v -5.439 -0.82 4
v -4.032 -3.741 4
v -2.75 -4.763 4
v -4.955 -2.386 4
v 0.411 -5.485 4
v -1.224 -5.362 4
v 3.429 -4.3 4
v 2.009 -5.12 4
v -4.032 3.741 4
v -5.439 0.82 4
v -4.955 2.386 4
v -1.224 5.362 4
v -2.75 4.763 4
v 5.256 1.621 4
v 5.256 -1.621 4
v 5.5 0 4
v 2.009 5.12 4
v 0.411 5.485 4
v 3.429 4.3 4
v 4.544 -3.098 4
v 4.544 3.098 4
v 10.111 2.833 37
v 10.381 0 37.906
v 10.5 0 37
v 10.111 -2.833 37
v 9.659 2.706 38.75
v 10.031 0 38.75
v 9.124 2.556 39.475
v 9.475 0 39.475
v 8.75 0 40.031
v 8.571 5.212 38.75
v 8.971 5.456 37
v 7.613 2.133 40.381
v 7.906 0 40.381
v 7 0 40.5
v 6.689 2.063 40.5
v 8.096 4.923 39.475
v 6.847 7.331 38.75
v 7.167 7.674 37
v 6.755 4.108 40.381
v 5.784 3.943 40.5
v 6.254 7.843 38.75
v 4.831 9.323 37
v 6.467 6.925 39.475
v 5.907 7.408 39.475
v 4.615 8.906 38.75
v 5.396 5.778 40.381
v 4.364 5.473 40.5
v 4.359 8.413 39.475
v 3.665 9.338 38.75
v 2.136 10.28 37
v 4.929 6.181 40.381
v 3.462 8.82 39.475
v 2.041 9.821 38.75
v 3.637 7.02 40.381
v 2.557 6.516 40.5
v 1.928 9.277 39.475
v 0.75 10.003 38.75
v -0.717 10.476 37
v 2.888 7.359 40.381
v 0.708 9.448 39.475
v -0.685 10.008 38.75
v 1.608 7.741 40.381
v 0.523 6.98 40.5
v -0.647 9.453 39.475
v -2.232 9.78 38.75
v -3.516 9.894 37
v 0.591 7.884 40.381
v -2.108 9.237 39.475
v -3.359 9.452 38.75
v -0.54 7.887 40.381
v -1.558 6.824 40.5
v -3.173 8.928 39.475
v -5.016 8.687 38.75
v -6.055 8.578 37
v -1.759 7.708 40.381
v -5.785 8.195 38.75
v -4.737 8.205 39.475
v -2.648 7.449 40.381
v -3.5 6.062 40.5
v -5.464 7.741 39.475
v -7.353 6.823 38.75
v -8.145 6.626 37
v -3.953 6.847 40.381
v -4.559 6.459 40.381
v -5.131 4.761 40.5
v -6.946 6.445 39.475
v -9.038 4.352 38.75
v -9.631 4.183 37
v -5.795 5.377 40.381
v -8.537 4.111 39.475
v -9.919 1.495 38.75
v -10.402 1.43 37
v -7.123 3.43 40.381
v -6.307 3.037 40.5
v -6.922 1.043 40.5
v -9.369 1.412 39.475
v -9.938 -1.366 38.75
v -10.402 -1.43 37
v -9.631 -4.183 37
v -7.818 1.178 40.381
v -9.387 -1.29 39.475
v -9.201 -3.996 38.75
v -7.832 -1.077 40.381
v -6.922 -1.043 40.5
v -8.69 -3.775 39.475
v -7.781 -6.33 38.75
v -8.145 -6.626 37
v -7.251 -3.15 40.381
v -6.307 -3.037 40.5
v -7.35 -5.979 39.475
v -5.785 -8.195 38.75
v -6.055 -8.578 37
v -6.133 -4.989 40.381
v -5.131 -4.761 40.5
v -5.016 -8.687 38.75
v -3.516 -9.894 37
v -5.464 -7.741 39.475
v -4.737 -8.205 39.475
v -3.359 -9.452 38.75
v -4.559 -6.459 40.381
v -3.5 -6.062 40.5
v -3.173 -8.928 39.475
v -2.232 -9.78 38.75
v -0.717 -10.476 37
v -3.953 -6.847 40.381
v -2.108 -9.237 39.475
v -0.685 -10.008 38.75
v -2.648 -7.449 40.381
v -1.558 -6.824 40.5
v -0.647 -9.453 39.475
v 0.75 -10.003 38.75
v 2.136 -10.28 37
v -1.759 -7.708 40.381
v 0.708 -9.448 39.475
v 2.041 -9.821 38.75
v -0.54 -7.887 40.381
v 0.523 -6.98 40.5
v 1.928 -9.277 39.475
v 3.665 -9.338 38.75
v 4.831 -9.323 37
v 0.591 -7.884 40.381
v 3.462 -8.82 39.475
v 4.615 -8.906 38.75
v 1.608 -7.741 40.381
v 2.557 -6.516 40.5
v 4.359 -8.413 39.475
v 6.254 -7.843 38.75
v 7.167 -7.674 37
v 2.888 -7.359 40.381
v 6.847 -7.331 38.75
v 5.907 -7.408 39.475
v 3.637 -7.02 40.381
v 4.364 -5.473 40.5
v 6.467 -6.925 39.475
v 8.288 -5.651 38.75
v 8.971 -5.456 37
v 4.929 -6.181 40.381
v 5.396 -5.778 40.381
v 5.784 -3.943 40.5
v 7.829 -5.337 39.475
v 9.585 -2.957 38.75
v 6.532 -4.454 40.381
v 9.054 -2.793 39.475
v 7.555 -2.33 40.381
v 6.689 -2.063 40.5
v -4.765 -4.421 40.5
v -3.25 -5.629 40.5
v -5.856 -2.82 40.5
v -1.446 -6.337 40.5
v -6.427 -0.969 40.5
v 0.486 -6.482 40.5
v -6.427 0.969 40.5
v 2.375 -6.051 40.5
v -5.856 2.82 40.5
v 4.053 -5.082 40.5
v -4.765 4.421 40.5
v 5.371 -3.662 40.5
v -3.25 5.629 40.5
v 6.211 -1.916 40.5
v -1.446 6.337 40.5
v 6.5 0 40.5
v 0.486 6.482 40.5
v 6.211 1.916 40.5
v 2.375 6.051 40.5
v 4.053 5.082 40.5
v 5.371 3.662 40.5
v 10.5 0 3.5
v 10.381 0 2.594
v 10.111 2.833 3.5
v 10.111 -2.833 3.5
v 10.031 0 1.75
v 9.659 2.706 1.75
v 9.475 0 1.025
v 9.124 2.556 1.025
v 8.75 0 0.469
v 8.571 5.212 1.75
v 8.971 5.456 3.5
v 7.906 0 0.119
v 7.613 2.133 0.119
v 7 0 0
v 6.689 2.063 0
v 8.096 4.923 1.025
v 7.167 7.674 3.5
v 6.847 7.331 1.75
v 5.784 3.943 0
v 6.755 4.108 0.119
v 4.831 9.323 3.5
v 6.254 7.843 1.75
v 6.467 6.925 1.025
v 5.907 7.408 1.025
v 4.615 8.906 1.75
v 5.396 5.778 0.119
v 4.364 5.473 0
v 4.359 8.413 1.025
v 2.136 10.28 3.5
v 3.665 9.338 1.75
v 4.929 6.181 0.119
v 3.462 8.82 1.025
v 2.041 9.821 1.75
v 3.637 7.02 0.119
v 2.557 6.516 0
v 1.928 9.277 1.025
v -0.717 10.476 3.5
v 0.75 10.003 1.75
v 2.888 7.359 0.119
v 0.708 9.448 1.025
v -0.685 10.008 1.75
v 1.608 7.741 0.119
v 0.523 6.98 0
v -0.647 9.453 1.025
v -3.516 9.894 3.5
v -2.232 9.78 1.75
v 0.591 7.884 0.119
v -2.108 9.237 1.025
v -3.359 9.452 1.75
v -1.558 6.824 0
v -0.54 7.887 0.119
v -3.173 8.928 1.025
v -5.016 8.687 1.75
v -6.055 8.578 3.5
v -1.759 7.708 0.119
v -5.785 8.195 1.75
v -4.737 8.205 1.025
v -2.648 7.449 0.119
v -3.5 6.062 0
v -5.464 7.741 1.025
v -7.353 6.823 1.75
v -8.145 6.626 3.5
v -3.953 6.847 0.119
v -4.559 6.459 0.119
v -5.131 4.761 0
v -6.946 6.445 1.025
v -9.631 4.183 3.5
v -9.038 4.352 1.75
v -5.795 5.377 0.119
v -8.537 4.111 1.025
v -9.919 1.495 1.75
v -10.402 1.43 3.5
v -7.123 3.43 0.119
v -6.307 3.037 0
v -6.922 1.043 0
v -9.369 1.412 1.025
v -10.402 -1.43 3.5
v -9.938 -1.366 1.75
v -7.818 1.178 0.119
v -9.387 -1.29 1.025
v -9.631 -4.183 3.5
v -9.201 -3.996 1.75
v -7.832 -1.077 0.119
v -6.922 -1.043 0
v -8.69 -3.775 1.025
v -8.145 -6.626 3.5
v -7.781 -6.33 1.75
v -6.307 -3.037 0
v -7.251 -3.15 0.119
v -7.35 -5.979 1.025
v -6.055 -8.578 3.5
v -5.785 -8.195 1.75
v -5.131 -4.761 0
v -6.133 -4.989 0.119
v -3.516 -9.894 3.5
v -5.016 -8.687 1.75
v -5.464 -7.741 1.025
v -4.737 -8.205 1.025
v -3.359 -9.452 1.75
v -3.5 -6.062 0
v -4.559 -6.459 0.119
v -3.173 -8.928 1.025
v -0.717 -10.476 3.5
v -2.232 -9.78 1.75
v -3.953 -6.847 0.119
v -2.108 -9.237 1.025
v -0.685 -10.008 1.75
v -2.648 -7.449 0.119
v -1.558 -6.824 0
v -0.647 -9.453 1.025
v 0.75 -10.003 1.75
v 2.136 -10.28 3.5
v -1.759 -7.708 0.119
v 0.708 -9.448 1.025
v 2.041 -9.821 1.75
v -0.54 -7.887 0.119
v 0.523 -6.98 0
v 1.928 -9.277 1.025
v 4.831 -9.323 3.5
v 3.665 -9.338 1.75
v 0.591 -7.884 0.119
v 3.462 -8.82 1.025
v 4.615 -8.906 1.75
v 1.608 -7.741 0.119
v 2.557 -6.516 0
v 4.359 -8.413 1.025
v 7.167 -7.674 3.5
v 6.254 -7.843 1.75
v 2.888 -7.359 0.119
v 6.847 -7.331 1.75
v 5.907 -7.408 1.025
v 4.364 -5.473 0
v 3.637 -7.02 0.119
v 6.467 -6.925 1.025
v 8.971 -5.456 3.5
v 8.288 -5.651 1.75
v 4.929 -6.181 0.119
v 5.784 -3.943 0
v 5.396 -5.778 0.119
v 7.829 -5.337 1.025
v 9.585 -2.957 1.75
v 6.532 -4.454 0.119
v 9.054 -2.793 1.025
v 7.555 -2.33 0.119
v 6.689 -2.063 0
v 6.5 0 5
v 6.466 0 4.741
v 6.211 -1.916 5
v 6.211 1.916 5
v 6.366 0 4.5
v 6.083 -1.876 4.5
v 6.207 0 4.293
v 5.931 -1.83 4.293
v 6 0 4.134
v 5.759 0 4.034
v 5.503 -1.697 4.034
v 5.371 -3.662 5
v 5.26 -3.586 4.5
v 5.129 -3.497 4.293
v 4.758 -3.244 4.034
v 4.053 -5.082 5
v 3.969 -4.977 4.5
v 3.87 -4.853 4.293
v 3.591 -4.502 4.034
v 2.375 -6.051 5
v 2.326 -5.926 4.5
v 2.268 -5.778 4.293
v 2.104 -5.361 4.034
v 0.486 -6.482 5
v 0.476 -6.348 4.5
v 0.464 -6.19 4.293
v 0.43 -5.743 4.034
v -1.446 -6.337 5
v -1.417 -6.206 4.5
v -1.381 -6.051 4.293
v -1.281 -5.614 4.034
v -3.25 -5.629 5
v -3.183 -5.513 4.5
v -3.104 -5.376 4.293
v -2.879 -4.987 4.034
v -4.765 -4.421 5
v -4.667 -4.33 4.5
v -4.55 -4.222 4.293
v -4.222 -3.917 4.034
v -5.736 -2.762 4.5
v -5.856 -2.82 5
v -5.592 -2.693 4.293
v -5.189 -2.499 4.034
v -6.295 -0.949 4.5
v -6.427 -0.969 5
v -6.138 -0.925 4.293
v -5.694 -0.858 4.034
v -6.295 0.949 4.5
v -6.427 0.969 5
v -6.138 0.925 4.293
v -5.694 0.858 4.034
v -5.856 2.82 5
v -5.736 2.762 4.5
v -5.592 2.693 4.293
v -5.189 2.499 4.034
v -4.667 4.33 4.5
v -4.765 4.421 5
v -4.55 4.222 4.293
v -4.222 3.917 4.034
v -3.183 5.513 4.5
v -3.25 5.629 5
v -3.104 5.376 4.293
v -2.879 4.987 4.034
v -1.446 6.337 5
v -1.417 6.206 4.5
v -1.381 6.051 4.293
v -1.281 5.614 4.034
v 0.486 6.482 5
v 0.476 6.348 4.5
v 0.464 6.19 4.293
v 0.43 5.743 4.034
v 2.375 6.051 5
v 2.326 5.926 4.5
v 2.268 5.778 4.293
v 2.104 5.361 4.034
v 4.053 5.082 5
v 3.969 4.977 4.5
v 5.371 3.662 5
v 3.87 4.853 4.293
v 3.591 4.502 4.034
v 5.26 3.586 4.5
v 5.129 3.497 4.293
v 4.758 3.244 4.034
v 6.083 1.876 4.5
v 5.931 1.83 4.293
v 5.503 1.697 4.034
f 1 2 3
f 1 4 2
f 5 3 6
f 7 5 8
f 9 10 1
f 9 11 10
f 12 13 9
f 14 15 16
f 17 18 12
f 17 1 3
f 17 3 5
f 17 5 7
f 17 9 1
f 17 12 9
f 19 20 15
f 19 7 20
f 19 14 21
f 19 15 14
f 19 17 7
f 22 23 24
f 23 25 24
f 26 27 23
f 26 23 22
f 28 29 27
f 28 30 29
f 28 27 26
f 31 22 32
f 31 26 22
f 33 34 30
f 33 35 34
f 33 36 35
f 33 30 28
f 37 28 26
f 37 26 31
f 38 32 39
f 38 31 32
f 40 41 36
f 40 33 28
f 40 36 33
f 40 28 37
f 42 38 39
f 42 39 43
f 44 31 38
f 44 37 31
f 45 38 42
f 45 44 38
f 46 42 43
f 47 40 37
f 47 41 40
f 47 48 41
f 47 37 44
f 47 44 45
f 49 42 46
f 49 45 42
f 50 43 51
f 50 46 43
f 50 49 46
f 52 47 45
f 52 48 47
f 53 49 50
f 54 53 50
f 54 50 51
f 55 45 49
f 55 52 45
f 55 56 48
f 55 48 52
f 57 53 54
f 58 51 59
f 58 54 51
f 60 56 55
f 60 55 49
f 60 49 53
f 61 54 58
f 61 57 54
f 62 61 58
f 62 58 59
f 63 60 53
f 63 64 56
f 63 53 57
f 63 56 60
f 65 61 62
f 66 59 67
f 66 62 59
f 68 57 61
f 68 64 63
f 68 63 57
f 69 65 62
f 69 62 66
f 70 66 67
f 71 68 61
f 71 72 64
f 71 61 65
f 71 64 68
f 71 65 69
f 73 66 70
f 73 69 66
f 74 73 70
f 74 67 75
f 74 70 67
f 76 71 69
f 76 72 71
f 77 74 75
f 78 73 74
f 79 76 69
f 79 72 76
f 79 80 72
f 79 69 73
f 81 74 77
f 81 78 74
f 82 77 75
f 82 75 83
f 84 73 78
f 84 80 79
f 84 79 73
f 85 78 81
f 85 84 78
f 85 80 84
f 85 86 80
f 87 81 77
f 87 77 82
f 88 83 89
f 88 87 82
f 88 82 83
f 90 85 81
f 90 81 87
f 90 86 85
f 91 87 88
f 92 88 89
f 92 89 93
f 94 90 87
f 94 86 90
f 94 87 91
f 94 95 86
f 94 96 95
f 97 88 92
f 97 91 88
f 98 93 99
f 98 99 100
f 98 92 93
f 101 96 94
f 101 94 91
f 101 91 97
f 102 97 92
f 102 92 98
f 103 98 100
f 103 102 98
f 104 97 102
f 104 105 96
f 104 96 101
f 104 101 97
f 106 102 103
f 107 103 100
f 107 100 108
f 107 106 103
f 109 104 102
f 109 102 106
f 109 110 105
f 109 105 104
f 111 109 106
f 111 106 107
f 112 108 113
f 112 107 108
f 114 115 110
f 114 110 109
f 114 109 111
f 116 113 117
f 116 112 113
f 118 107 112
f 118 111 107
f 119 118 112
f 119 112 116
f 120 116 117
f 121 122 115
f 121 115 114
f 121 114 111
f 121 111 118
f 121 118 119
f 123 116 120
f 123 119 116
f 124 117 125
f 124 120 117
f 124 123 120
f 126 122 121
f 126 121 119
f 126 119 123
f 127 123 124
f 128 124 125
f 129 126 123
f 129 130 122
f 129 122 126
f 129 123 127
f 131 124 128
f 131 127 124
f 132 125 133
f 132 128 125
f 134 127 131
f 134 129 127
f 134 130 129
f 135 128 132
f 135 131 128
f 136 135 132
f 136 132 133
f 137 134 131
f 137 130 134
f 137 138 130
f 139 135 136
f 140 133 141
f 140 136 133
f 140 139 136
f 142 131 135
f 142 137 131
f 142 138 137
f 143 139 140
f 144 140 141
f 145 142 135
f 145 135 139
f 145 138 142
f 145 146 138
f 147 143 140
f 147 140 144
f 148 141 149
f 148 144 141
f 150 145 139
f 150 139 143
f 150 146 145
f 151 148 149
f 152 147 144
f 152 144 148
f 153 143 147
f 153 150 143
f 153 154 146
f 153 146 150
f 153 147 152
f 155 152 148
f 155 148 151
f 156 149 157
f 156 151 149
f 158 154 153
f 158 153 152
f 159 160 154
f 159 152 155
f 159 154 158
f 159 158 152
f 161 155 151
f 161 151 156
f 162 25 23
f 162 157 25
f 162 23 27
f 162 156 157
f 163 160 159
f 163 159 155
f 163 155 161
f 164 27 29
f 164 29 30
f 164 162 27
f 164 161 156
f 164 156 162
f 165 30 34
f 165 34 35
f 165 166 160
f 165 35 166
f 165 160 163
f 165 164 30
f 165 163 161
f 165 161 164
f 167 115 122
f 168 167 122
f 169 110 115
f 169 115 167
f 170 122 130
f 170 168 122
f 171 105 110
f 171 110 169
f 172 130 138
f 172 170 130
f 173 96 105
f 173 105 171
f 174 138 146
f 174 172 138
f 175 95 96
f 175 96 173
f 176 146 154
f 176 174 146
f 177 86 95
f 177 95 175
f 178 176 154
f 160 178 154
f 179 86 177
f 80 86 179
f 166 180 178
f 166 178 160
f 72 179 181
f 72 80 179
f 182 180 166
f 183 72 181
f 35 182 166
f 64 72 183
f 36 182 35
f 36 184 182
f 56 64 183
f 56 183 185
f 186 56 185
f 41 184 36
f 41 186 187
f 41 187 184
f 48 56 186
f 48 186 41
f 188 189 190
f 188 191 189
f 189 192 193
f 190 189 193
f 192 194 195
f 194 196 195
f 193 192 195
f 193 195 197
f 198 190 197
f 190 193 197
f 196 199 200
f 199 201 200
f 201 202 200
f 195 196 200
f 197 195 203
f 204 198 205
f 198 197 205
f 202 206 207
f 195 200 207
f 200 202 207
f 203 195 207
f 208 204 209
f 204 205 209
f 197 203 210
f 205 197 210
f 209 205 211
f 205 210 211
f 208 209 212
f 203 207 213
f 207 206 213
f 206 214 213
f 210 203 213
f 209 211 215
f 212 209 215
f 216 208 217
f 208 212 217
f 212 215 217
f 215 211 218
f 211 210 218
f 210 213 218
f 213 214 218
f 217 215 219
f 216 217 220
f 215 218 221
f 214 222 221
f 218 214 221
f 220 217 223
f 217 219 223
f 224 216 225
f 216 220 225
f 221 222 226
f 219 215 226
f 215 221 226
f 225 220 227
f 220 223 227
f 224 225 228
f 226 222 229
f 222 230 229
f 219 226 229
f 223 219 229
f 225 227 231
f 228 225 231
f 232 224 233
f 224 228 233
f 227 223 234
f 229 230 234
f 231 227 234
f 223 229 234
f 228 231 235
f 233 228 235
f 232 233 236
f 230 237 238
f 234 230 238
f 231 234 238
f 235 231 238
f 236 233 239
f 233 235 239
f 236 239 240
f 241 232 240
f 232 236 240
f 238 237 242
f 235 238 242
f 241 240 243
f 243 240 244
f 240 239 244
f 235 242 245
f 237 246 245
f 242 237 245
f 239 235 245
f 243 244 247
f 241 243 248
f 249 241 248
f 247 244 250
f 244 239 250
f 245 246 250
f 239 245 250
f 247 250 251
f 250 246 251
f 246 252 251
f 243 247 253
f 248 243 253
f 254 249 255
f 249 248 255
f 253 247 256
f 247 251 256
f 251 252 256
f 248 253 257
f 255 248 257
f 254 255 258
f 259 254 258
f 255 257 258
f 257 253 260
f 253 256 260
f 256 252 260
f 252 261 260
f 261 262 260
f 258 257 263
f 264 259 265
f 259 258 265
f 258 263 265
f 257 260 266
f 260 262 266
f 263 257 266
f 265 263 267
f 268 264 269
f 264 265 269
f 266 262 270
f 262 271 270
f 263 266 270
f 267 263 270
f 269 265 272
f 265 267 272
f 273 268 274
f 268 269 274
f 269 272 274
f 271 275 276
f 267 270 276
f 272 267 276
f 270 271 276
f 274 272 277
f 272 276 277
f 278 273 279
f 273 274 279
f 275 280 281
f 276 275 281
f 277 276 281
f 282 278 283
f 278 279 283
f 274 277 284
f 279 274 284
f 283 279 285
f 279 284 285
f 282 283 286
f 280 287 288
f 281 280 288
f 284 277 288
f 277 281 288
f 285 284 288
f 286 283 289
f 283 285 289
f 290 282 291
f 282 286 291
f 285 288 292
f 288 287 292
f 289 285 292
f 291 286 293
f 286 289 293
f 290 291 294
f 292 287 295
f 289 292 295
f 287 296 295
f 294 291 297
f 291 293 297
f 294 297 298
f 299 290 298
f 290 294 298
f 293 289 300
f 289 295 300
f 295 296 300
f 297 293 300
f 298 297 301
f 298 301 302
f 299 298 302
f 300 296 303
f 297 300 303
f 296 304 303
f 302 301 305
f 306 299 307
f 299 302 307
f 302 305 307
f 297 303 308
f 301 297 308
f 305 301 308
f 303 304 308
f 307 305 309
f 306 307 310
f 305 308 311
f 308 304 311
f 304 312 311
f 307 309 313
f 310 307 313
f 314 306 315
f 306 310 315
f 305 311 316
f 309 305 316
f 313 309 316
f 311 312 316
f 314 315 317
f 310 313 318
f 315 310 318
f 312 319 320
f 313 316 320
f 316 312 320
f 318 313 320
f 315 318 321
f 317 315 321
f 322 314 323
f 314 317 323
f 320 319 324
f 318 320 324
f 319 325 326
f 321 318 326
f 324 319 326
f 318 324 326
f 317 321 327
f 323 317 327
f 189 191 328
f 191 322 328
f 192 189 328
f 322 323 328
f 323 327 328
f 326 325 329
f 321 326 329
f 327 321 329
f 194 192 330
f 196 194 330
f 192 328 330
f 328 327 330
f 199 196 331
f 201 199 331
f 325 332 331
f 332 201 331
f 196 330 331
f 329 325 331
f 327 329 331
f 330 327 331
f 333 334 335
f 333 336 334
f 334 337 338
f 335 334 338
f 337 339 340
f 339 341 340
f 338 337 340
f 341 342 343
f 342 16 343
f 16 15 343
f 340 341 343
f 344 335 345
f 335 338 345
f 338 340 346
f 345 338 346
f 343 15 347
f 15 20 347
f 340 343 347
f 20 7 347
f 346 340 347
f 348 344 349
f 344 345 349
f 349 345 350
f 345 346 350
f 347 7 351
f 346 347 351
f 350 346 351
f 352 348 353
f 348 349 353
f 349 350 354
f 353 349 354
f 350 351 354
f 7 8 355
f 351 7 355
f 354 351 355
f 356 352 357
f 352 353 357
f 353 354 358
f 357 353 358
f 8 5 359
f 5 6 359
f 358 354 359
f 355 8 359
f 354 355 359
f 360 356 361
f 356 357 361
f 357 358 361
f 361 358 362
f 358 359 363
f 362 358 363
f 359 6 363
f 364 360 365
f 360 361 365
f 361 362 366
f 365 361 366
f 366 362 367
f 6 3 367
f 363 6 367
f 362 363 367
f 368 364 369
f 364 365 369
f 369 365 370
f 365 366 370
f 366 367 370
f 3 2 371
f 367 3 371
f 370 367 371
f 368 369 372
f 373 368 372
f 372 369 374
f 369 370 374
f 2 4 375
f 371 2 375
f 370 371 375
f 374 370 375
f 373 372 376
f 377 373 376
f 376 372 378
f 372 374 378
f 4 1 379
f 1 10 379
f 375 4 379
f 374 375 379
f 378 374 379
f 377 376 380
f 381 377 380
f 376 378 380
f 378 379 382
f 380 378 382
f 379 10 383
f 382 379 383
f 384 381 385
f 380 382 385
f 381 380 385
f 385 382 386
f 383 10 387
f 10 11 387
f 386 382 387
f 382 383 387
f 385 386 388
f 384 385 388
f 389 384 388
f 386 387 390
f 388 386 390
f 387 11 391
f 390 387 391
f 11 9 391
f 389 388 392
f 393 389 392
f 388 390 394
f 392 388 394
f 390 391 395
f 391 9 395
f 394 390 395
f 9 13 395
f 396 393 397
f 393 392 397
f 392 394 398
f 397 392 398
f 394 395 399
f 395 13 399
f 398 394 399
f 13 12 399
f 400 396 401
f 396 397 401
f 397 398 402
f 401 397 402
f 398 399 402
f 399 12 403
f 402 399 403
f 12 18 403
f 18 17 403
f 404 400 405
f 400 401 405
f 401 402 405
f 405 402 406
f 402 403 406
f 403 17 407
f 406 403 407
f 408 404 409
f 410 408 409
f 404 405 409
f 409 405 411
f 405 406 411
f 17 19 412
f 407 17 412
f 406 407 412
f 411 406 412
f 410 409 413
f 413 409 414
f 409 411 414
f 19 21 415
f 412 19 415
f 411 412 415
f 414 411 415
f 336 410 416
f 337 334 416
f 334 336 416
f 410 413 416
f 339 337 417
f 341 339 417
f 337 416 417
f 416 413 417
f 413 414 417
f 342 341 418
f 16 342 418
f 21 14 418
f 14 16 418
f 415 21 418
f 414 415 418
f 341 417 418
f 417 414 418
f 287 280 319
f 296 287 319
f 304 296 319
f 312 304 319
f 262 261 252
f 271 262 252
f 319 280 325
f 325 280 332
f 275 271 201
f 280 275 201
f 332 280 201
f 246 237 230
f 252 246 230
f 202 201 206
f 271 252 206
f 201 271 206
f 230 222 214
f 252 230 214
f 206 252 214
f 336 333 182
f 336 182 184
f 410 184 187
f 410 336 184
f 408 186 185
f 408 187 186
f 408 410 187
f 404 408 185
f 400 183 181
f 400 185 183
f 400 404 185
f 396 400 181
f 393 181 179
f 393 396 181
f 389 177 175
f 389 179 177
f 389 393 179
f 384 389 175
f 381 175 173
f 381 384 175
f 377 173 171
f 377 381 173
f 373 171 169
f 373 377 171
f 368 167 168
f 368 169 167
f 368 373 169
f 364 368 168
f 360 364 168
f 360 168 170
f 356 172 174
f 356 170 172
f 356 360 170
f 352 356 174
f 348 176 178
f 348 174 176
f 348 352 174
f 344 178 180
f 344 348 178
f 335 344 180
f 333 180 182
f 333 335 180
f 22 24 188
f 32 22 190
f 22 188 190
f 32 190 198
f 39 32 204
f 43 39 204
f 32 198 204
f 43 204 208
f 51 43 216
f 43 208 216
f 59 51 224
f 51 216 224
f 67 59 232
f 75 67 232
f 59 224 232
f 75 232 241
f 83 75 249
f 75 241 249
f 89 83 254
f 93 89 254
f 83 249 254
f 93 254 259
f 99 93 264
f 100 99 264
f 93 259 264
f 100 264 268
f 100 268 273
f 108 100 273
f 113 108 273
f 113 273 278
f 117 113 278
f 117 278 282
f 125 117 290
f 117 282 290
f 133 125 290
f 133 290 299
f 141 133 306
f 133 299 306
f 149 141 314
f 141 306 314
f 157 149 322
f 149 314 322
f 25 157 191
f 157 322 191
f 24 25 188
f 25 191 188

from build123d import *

# Parameters (mm, degrees)
SKETCH1_R           = 10.5
BOSS_EXTRUDE1_DEPTH = 40.5
SHELL1_T            = -4
FILLET1_R           = 3.5
FILLET2_R           = 3.5
FILLET3_R           = 1


with BuildPart() as part:
    # Sketch1 → Boss-Extrude1 (new body)
    with BuildSketch(Plane.XY):
        Circle(SKETCH1_R)
    extrude(amount=BOSS_EXTRUDE1_DEPTH)

    # Shell1
    shell1_openings = [part.faces().sort_by_distance(p)[0] for p in [
        (0, 0, 40.5),
    ]]
    offset(amount=SHELL1_T, openings=shell1_openings, kind=Kind.INTERSECTION)

    # Fillet1
    fillet1_edges = [part.edges().sort_by_distance(p)[0] for p in [
        (-10.5, 0, 40.5),
    ]]
    fillet(fillet1_edges, radius=FILLET1_R)

    # Fillet2
    fillet2_edges = [part.edges().sort_by_distance(p)[0] for p in [
        (-10.5, 0, 0),
    ]]
    fillet(fillet2_edges, radius=FILLET2_R)

    # Fillet3
    fillet3_edges = [part.edges().sort_by_distance(p)[0] for p in [
        (-6.5, 0, 4),
    ]]
    fillet(fillet3_edges, radius=FILLET3_R)


solid = part.part
